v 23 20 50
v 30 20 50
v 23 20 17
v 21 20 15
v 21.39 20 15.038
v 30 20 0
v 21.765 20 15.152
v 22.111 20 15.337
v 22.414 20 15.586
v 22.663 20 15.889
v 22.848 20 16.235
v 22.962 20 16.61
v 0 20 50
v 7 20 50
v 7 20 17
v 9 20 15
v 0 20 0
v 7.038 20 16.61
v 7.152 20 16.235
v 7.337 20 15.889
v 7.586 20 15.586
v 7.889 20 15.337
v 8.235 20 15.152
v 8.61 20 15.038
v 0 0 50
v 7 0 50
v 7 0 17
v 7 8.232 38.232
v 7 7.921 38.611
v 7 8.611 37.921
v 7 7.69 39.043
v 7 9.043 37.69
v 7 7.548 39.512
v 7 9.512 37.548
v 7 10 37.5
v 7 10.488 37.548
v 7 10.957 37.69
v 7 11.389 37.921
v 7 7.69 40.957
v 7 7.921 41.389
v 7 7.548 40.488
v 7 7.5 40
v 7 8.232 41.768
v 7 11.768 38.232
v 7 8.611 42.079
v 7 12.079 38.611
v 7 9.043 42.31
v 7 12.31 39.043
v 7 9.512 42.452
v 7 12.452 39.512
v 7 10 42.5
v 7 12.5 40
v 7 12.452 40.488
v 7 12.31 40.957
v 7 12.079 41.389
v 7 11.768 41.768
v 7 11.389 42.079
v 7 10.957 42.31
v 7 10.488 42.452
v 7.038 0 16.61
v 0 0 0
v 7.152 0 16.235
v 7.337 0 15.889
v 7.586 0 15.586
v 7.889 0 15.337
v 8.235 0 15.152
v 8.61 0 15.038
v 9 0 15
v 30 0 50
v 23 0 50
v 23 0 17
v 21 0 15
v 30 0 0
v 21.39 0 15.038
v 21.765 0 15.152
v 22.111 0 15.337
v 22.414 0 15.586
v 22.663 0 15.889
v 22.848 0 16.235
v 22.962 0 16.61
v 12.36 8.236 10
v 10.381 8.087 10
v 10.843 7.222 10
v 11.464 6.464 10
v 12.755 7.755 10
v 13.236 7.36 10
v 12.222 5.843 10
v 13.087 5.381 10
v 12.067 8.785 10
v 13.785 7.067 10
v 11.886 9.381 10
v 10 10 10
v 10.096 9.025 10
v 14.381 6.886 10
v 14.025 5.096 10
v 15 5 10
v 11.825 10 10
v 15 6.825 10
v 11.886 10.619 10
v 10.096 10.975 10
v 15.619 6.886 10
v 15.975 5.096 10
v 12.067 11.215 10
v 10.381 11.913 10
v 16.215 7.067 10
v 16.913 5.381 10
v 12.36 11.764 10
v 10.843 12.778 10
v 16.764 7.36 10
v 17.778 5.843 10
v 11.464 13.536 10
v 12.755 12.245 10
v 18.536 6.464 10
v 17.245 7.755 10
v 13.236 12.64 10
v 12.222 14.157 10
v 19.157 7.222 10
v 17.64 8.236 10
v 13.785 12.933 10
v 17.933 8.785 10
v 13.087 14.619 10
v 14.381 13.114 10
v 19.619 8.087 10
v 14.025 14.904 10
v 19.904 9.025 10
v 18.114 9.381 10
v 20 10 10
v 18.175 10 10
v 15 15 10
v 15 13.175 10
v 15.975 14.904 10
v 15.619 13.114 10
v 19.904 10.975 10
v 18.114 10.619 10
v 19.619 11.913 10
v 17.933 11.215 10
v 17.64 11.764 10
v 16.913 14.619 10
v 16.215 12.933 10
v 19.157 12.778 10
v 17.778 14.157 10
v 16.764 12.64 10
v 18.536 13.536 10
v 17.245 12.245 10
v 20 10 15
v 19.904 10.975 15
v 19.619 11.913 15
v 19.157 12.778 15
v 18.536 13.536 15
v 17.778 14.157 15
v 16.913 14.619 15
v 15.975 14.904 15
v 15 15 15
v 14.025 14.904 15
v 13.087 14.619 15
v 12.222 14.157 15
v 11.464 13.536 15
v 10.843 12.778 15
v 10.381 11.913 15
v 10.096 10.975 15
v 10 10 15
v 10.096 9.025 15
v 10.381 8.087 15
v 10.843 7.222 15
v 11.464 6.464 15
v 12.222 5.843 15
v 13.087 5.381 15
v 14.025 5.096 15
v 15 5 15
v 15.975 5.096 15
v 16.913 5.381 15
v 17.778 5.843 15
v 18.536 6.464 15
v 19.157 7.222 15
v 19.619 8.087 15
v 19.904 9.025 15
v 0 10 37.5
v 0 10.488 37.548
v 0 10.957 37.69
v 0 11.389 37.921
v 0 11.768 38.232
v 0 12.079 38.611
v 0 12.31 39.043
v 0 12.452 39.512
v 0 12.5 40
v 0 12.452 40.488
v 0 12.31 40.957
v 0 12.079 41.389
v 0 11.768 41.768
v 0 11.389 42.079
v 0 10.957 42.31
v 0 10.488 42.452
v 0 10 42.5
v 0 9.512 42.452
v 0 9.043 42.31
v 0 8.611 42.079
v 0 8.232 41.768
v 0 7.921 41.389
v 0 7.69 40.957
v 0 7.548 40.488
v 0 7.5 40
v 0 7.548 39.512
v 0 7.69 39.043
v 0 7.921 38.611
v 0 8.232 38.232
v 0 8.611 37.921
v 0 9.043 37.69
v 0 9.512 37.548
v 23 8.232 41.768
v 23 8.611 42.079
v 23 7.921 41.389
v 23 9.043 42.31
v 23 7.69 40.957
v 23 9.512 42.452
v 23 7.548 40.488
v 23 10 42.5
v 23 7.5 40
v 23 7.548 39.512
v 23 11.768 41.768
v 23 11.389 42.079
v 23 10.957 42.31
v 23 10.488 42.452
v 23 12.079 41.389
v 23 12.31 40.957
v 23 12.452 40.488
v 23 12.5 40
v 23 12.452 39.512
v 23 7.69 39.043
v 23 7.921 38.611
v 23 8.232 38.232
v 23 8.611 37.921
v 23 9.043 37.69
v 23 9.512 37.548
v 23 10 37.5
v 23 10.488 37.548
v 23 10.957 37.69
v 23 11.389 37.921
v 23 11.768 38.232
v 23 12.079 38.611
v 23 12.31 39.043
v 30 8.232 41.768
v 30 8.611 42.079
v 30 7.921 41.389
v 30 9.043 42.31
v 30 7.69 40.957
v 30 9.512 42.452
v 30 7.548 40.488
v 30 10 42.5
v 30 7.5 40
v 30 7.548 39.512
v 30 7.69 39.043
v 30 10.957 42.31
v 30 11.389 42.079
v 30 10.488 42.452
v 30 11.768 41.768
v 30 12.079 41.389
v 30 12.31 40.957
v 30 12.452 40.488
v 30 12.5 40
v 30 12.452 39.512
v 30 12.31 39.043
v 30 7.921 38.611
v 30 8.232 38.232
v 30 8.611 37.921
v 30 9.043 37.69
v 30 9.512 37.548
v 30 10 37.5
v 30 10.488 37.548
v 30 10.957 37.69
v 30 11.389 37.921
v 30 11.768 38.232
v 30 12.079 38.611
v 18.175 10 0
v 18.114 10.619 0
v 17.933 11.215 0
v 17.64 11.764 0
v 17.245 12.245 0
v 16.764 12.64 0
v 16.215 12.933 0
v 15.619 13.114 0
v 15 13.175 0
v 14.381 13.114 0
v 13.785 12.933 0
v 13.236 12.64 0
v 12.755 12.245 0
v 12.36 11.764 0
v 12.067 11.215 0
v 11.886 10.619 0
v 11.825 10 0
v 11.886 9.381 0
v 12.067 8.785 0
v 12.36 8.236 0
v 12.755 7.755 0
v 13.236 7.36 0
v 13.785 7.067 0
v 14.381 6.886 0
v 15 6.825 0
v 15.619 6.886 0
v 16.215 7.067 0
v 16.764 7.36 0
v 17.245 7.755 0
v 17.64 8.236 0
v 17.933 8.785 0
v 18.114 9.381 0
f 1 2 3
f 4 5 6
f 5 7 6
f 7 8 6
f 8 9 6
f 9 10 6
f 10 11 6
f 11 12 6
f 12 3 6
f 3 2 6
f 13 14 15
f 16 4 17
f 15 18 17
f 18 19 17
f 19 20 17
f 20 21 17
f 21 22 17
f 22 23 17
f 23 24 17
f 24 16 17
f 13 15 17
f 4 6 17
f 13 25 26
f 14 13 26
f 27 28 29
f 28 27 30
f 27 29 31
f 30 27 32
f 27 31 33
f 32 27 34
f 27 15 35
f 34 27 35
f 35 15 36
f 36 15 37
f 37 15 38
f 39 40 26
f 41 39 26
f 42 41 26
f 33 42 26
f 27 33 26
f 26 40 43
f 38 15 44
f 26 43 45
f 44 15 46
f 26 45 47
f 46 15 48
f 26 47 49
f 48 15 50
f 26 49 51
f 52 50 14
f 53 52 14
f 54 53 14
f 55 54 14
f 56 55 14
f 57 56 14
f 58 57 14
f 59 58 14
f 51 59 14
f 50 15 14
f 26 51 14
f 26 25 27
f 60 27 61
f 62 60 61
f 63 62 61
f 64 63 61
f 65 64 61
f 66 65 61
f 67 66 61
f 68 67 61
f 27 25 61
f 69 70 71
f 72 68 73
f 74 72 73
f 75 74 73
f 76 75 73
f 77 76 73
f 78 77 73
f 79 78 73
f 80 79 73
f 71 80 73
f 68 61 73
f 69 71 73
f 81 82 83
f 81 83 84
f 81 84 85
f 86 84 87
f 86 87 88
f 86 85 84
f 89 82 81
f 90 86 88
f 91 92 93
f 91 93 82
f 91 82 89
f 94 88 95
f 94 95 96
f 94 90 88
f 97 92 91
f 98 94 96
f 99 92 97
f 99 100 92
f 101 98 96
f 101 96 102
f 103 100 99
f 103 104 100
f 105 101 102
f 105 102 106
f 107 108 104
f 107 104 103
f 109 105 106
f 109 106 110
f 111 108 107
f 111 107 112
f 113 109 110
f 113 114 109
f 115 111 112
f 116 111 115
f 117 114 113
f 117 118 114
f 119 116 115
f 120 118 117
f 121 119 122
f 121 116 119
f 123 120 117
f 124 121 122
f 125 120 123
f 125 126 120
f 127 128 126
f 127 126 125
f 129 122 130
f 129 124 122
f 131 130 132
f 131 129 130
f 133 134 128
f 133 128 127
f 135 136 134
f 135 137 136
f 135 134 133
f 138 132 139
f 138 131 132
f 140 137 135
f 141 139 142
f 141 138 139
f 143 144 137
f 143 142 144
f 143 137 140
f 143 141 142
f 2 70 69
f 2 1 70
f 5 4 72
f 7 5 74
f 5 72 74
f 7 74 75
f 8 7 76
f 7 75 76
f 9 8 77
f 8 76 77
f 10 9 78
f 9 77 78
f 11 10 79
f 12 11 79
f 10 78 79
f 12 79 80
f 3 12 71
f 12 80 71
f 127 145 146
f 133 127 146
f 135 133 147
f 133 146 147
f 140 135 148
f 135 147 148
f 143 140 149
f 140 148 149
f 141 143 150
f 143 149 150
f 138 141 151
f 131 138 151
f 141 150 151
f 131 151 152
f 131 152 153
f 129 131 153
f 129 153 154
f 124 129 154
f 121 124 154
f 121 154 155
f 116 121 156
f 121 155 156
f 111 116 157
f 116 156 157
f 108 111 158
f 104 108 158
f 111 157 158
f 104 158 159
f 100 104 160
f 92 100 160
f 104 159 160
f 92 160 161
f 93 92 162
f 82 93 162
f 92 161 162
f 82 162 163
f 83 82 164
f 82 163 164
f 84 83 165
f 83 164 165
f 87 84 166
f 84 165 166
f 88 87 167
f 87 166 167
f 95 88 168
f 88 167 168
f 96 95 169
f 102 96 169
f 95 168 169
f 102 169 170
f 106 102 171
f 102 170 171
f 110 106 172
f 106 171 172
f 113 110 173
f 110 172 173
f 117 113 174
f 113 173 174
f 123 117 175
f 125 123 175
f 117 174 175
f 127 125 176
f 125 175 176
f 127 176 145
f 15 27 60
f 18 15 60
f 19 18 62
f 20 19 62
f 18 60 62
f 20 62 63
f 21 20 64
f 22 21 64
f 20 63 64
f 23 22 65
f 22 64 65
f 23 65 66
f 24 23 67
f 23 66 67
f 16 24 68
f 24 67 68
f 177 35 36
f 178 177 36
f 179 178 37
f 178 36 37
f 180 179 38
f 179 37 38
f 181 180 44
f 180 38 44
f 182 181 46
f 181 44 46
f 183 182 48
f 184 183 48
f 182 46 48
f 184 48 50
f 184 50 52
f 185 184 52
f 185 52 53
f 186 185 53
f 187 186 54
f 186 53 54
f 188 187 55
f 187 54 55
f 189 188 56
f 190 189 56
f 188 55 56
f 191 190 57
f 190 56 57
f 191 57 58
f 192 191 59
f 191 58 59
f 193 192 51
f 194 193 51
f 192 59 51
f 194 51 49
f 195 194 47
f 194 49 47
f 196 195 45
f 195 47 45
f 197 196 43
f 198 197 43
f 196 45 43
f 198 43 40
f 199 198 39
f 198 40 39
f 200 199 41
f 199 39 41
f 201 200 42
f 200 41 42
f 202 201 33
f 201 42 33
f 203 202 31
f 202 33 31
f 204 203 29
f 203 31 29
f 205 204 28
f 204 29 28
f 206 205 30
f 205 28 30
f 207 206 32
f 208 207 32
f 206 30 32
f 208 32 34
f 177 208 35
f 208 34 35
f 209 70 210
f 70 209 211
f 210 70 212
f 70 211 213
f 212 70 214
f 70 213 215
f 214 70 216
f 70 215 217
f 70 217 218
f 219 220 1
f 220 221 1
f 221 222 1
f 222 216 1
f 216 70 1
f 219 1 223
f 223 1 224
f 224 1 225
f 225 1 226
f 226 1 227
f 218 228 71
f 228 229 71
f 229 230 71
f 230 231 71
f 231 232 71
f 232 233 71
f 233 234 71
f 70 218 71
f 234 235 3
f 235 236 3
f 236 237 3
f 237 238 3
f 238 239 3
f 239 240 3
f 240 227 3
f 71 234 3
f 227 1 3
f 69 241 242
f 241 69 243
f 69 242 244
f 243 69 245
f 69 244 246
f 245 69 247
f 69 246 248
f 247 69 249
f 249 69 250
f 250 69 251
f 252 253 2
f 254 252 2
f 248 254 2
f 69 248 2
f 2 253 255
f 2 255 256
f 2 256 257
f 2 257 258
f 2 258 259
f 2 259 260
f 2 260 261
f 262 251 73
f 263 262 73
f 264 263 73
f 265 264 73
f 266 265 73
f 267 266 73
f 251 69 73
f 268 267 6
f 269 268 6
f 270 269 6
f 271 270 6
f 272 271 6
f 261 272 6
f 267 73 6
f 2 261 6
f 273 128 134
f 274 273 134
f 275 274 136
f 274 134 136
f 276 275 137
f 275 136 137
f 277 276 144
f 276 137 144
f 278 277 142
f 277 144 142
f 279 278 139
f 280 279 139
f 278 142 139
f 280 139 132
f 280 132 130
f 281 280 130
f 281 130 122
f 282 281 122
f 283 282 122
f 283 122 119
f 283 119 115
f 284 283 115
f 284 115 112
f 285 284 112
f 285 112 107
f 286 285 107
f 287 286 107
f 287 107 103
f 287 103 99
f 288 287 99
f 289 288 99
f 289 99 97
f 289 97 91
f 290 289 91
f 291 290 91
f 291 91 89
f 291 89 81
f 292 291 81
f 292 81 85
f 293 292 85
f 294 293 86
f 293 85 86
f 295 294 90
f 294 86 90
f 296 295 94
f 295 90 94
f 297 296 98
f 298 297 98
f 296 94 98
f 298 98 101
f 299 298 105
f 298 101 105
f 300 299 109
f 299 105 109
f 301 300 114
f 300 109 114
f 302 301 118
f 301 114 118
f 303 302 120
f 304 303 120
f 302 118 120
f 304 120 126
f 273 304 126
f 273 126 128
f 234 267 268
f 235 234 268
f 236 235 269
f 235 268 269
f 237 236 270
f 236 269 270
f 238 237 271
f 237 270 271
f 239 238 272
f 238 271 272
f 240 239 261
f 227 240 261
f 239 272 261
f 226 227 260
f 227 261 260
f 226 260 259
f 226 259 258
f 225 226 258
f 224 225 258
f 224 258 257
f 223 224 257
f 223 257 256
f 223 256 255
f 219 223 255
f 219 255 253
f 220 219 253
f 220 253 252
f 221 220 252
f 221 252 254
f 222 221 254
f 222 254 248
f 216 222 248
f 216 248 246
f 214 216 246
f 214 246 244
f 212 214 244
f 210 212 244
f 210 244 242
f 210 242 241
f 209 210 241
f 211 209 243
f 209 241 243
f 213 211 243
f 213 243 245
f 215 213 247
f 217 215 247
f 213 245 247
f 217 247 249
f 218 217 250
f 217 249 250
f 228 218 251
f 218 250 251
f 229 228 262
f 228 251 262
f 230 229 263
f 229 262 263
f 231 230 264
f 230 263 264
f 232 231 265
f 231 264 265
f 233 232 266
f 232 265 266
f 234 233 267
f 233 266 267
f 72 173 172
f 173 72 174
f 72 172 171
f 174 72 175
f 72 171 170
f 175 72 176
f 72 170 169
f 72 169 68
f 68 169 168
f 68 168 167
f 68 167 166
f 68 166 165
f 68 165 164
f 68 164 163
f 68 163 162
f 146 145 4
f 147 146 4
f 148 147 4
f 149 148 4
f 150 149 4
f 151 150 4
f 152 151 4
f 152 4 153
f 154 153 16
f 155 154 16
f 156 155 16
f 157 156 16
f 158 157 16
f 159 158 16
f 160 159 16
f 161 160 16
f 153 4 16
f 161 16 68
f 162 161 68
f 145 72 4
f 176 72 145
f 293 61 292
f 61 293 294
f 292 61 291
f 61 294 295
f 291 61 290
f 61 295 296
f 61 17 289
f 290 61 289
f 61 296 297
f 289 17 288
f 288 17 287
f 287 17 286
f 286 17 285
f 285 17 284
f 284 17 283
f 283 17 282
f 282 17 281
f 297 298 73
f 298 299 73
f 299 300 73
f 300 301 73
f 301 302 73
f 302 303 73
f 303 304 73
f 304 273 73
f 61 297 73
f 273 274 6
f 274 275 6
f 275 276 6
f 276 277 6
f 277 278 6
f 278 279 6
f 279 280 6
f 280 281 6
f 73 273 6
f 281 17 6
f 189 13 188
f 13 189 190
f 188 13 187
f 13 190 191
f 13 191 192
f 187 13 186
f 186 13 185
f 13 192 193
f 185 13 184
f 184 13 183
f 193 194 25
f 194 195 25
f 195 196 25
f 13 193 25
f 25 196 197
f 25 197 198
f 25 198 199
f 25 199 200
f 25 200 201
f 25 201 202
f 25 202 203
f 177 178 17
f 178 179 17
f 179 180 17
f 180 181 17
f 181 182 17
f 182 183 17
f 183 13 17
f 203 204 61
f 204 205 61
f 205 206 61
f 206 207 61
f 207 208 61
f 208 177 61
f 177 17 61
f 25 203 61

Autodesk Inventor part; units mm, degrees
ref_plane "YZ Plane" through (0, 0, 0) normal (1, 0, 0) x (0, 1, 0)
ref_plane "XZ Plane" through (0, 0, 0) normal (0, 1, 0) x (-1, 0, 0)
ref_plane "XY Plane" through (0, 0, 0) normal (0, 0, 1) x (1, 0, 0)
sketch "Sketch1" plane through (0, 0, 0) normal (0, 0, 1) x (1, 0, 0)
  line L0 (0, 0) -> (30, 0)
  line L1 (30, 0) -> (30, 20)
  line L2 (30, 20) -> (0, 20)
  line L3 (0, 20) -> (0, 0)
  dimension "d0" = 30
  dimension "d1" = 20
extrude "Extrusion1" add sketch "Sketch1" along normal blind 50
sketch "Sketch2" plane through (0, 20, 0) normal (0, 1, 0) x (1, 0, 0)
  line L0 (30, 0) -> (0, 0) projected
  line L1 (0, 0) -> (0, -50) projected
  line L2 (30, -50) -> (0, -50) projected
  line L3 (30, 0) -> (30, -50) projected
  line L4 (7, -50) -> (23, -50)
  line L5 (23, -50) -> (23, -15)
  line L6 (23, -15) -> (7, -15)
  line L7 (7, -15) -> (7, -50)
  point P0 (0, 0)
  dimension "d5" = 7
  dimension "d8" = 15
  dimension "d26" = 7
extrude "Extrusion2" cut sketch "Sketch2" against normal up to next contours L2 L7 L6 L5
sketch "Sketch3" plane through (30, 0, 0) normal (1, 0, 0) x (0, 0, -1)
  line L0 (0, 0) -> (0, 20) projected
  line L1 (0, 20) -> (-50, 20) projected
  line L2 (-50, 0) -> (-50, 20) projected
  line L3 (0, 0) -> (-50, 0) projected
  circle A0 centre (-40, 10) radius 2.5
  point P0 (0, 0)
  dimension "d11" = 5
  dimension "d12" = 10
  dimension "d13" = 10
extrude "Extrusion3" cut sketch "Sketch3" against normal through all contours A0
sketch "Sketch4" plane through (7, 20, 15) normal (0, 0, 1) x (1, 0, 0)
  line L0 (16, -20) -> (0, -20) projected
  line L1 (16, 0) -> (16, -20) projected
  line L2 (0, 0) -> (16, 0) projected
  line L3 (0, 0) -> (0, -20) projected
  circle A0 centre (8, -10) radius 5
  line L4 (-7, 0) -> (-7, -20) projected
  dimension "d16" = 10
  dimension "d17" = 10
  dimension "d29" = 15
extrude "Extrusion4" cut sketch "Sketch4" against normal blind 5 contours A0
sketch "Sketch5" plane through (15, 10, 10) normal (0, 0, 1) x (1, 0, 0)
  circle A0 centre (0, 0) radius 3.175
  line L0 (8, -10) -> (-8, -10) projected
  line L1 (-8, -10) -> (-8, 10) projected
  line L2 (-15, 10) -> (-15, -10) projected
  dimension "d21" = 6.35
  dimension "d22" = 10
  dimension "d30" = 15
extrude "Extrusion5" cut sketch "Sketch5" against normal up to next
fillet "Fillet1" radius 2 1 edges at (7, 10, 15)
fillet "Fillet2" radius 2 1 edges at (23, 10, 15)
properties part number "X_Rail_Belt_Pulley_Connector(2)"
